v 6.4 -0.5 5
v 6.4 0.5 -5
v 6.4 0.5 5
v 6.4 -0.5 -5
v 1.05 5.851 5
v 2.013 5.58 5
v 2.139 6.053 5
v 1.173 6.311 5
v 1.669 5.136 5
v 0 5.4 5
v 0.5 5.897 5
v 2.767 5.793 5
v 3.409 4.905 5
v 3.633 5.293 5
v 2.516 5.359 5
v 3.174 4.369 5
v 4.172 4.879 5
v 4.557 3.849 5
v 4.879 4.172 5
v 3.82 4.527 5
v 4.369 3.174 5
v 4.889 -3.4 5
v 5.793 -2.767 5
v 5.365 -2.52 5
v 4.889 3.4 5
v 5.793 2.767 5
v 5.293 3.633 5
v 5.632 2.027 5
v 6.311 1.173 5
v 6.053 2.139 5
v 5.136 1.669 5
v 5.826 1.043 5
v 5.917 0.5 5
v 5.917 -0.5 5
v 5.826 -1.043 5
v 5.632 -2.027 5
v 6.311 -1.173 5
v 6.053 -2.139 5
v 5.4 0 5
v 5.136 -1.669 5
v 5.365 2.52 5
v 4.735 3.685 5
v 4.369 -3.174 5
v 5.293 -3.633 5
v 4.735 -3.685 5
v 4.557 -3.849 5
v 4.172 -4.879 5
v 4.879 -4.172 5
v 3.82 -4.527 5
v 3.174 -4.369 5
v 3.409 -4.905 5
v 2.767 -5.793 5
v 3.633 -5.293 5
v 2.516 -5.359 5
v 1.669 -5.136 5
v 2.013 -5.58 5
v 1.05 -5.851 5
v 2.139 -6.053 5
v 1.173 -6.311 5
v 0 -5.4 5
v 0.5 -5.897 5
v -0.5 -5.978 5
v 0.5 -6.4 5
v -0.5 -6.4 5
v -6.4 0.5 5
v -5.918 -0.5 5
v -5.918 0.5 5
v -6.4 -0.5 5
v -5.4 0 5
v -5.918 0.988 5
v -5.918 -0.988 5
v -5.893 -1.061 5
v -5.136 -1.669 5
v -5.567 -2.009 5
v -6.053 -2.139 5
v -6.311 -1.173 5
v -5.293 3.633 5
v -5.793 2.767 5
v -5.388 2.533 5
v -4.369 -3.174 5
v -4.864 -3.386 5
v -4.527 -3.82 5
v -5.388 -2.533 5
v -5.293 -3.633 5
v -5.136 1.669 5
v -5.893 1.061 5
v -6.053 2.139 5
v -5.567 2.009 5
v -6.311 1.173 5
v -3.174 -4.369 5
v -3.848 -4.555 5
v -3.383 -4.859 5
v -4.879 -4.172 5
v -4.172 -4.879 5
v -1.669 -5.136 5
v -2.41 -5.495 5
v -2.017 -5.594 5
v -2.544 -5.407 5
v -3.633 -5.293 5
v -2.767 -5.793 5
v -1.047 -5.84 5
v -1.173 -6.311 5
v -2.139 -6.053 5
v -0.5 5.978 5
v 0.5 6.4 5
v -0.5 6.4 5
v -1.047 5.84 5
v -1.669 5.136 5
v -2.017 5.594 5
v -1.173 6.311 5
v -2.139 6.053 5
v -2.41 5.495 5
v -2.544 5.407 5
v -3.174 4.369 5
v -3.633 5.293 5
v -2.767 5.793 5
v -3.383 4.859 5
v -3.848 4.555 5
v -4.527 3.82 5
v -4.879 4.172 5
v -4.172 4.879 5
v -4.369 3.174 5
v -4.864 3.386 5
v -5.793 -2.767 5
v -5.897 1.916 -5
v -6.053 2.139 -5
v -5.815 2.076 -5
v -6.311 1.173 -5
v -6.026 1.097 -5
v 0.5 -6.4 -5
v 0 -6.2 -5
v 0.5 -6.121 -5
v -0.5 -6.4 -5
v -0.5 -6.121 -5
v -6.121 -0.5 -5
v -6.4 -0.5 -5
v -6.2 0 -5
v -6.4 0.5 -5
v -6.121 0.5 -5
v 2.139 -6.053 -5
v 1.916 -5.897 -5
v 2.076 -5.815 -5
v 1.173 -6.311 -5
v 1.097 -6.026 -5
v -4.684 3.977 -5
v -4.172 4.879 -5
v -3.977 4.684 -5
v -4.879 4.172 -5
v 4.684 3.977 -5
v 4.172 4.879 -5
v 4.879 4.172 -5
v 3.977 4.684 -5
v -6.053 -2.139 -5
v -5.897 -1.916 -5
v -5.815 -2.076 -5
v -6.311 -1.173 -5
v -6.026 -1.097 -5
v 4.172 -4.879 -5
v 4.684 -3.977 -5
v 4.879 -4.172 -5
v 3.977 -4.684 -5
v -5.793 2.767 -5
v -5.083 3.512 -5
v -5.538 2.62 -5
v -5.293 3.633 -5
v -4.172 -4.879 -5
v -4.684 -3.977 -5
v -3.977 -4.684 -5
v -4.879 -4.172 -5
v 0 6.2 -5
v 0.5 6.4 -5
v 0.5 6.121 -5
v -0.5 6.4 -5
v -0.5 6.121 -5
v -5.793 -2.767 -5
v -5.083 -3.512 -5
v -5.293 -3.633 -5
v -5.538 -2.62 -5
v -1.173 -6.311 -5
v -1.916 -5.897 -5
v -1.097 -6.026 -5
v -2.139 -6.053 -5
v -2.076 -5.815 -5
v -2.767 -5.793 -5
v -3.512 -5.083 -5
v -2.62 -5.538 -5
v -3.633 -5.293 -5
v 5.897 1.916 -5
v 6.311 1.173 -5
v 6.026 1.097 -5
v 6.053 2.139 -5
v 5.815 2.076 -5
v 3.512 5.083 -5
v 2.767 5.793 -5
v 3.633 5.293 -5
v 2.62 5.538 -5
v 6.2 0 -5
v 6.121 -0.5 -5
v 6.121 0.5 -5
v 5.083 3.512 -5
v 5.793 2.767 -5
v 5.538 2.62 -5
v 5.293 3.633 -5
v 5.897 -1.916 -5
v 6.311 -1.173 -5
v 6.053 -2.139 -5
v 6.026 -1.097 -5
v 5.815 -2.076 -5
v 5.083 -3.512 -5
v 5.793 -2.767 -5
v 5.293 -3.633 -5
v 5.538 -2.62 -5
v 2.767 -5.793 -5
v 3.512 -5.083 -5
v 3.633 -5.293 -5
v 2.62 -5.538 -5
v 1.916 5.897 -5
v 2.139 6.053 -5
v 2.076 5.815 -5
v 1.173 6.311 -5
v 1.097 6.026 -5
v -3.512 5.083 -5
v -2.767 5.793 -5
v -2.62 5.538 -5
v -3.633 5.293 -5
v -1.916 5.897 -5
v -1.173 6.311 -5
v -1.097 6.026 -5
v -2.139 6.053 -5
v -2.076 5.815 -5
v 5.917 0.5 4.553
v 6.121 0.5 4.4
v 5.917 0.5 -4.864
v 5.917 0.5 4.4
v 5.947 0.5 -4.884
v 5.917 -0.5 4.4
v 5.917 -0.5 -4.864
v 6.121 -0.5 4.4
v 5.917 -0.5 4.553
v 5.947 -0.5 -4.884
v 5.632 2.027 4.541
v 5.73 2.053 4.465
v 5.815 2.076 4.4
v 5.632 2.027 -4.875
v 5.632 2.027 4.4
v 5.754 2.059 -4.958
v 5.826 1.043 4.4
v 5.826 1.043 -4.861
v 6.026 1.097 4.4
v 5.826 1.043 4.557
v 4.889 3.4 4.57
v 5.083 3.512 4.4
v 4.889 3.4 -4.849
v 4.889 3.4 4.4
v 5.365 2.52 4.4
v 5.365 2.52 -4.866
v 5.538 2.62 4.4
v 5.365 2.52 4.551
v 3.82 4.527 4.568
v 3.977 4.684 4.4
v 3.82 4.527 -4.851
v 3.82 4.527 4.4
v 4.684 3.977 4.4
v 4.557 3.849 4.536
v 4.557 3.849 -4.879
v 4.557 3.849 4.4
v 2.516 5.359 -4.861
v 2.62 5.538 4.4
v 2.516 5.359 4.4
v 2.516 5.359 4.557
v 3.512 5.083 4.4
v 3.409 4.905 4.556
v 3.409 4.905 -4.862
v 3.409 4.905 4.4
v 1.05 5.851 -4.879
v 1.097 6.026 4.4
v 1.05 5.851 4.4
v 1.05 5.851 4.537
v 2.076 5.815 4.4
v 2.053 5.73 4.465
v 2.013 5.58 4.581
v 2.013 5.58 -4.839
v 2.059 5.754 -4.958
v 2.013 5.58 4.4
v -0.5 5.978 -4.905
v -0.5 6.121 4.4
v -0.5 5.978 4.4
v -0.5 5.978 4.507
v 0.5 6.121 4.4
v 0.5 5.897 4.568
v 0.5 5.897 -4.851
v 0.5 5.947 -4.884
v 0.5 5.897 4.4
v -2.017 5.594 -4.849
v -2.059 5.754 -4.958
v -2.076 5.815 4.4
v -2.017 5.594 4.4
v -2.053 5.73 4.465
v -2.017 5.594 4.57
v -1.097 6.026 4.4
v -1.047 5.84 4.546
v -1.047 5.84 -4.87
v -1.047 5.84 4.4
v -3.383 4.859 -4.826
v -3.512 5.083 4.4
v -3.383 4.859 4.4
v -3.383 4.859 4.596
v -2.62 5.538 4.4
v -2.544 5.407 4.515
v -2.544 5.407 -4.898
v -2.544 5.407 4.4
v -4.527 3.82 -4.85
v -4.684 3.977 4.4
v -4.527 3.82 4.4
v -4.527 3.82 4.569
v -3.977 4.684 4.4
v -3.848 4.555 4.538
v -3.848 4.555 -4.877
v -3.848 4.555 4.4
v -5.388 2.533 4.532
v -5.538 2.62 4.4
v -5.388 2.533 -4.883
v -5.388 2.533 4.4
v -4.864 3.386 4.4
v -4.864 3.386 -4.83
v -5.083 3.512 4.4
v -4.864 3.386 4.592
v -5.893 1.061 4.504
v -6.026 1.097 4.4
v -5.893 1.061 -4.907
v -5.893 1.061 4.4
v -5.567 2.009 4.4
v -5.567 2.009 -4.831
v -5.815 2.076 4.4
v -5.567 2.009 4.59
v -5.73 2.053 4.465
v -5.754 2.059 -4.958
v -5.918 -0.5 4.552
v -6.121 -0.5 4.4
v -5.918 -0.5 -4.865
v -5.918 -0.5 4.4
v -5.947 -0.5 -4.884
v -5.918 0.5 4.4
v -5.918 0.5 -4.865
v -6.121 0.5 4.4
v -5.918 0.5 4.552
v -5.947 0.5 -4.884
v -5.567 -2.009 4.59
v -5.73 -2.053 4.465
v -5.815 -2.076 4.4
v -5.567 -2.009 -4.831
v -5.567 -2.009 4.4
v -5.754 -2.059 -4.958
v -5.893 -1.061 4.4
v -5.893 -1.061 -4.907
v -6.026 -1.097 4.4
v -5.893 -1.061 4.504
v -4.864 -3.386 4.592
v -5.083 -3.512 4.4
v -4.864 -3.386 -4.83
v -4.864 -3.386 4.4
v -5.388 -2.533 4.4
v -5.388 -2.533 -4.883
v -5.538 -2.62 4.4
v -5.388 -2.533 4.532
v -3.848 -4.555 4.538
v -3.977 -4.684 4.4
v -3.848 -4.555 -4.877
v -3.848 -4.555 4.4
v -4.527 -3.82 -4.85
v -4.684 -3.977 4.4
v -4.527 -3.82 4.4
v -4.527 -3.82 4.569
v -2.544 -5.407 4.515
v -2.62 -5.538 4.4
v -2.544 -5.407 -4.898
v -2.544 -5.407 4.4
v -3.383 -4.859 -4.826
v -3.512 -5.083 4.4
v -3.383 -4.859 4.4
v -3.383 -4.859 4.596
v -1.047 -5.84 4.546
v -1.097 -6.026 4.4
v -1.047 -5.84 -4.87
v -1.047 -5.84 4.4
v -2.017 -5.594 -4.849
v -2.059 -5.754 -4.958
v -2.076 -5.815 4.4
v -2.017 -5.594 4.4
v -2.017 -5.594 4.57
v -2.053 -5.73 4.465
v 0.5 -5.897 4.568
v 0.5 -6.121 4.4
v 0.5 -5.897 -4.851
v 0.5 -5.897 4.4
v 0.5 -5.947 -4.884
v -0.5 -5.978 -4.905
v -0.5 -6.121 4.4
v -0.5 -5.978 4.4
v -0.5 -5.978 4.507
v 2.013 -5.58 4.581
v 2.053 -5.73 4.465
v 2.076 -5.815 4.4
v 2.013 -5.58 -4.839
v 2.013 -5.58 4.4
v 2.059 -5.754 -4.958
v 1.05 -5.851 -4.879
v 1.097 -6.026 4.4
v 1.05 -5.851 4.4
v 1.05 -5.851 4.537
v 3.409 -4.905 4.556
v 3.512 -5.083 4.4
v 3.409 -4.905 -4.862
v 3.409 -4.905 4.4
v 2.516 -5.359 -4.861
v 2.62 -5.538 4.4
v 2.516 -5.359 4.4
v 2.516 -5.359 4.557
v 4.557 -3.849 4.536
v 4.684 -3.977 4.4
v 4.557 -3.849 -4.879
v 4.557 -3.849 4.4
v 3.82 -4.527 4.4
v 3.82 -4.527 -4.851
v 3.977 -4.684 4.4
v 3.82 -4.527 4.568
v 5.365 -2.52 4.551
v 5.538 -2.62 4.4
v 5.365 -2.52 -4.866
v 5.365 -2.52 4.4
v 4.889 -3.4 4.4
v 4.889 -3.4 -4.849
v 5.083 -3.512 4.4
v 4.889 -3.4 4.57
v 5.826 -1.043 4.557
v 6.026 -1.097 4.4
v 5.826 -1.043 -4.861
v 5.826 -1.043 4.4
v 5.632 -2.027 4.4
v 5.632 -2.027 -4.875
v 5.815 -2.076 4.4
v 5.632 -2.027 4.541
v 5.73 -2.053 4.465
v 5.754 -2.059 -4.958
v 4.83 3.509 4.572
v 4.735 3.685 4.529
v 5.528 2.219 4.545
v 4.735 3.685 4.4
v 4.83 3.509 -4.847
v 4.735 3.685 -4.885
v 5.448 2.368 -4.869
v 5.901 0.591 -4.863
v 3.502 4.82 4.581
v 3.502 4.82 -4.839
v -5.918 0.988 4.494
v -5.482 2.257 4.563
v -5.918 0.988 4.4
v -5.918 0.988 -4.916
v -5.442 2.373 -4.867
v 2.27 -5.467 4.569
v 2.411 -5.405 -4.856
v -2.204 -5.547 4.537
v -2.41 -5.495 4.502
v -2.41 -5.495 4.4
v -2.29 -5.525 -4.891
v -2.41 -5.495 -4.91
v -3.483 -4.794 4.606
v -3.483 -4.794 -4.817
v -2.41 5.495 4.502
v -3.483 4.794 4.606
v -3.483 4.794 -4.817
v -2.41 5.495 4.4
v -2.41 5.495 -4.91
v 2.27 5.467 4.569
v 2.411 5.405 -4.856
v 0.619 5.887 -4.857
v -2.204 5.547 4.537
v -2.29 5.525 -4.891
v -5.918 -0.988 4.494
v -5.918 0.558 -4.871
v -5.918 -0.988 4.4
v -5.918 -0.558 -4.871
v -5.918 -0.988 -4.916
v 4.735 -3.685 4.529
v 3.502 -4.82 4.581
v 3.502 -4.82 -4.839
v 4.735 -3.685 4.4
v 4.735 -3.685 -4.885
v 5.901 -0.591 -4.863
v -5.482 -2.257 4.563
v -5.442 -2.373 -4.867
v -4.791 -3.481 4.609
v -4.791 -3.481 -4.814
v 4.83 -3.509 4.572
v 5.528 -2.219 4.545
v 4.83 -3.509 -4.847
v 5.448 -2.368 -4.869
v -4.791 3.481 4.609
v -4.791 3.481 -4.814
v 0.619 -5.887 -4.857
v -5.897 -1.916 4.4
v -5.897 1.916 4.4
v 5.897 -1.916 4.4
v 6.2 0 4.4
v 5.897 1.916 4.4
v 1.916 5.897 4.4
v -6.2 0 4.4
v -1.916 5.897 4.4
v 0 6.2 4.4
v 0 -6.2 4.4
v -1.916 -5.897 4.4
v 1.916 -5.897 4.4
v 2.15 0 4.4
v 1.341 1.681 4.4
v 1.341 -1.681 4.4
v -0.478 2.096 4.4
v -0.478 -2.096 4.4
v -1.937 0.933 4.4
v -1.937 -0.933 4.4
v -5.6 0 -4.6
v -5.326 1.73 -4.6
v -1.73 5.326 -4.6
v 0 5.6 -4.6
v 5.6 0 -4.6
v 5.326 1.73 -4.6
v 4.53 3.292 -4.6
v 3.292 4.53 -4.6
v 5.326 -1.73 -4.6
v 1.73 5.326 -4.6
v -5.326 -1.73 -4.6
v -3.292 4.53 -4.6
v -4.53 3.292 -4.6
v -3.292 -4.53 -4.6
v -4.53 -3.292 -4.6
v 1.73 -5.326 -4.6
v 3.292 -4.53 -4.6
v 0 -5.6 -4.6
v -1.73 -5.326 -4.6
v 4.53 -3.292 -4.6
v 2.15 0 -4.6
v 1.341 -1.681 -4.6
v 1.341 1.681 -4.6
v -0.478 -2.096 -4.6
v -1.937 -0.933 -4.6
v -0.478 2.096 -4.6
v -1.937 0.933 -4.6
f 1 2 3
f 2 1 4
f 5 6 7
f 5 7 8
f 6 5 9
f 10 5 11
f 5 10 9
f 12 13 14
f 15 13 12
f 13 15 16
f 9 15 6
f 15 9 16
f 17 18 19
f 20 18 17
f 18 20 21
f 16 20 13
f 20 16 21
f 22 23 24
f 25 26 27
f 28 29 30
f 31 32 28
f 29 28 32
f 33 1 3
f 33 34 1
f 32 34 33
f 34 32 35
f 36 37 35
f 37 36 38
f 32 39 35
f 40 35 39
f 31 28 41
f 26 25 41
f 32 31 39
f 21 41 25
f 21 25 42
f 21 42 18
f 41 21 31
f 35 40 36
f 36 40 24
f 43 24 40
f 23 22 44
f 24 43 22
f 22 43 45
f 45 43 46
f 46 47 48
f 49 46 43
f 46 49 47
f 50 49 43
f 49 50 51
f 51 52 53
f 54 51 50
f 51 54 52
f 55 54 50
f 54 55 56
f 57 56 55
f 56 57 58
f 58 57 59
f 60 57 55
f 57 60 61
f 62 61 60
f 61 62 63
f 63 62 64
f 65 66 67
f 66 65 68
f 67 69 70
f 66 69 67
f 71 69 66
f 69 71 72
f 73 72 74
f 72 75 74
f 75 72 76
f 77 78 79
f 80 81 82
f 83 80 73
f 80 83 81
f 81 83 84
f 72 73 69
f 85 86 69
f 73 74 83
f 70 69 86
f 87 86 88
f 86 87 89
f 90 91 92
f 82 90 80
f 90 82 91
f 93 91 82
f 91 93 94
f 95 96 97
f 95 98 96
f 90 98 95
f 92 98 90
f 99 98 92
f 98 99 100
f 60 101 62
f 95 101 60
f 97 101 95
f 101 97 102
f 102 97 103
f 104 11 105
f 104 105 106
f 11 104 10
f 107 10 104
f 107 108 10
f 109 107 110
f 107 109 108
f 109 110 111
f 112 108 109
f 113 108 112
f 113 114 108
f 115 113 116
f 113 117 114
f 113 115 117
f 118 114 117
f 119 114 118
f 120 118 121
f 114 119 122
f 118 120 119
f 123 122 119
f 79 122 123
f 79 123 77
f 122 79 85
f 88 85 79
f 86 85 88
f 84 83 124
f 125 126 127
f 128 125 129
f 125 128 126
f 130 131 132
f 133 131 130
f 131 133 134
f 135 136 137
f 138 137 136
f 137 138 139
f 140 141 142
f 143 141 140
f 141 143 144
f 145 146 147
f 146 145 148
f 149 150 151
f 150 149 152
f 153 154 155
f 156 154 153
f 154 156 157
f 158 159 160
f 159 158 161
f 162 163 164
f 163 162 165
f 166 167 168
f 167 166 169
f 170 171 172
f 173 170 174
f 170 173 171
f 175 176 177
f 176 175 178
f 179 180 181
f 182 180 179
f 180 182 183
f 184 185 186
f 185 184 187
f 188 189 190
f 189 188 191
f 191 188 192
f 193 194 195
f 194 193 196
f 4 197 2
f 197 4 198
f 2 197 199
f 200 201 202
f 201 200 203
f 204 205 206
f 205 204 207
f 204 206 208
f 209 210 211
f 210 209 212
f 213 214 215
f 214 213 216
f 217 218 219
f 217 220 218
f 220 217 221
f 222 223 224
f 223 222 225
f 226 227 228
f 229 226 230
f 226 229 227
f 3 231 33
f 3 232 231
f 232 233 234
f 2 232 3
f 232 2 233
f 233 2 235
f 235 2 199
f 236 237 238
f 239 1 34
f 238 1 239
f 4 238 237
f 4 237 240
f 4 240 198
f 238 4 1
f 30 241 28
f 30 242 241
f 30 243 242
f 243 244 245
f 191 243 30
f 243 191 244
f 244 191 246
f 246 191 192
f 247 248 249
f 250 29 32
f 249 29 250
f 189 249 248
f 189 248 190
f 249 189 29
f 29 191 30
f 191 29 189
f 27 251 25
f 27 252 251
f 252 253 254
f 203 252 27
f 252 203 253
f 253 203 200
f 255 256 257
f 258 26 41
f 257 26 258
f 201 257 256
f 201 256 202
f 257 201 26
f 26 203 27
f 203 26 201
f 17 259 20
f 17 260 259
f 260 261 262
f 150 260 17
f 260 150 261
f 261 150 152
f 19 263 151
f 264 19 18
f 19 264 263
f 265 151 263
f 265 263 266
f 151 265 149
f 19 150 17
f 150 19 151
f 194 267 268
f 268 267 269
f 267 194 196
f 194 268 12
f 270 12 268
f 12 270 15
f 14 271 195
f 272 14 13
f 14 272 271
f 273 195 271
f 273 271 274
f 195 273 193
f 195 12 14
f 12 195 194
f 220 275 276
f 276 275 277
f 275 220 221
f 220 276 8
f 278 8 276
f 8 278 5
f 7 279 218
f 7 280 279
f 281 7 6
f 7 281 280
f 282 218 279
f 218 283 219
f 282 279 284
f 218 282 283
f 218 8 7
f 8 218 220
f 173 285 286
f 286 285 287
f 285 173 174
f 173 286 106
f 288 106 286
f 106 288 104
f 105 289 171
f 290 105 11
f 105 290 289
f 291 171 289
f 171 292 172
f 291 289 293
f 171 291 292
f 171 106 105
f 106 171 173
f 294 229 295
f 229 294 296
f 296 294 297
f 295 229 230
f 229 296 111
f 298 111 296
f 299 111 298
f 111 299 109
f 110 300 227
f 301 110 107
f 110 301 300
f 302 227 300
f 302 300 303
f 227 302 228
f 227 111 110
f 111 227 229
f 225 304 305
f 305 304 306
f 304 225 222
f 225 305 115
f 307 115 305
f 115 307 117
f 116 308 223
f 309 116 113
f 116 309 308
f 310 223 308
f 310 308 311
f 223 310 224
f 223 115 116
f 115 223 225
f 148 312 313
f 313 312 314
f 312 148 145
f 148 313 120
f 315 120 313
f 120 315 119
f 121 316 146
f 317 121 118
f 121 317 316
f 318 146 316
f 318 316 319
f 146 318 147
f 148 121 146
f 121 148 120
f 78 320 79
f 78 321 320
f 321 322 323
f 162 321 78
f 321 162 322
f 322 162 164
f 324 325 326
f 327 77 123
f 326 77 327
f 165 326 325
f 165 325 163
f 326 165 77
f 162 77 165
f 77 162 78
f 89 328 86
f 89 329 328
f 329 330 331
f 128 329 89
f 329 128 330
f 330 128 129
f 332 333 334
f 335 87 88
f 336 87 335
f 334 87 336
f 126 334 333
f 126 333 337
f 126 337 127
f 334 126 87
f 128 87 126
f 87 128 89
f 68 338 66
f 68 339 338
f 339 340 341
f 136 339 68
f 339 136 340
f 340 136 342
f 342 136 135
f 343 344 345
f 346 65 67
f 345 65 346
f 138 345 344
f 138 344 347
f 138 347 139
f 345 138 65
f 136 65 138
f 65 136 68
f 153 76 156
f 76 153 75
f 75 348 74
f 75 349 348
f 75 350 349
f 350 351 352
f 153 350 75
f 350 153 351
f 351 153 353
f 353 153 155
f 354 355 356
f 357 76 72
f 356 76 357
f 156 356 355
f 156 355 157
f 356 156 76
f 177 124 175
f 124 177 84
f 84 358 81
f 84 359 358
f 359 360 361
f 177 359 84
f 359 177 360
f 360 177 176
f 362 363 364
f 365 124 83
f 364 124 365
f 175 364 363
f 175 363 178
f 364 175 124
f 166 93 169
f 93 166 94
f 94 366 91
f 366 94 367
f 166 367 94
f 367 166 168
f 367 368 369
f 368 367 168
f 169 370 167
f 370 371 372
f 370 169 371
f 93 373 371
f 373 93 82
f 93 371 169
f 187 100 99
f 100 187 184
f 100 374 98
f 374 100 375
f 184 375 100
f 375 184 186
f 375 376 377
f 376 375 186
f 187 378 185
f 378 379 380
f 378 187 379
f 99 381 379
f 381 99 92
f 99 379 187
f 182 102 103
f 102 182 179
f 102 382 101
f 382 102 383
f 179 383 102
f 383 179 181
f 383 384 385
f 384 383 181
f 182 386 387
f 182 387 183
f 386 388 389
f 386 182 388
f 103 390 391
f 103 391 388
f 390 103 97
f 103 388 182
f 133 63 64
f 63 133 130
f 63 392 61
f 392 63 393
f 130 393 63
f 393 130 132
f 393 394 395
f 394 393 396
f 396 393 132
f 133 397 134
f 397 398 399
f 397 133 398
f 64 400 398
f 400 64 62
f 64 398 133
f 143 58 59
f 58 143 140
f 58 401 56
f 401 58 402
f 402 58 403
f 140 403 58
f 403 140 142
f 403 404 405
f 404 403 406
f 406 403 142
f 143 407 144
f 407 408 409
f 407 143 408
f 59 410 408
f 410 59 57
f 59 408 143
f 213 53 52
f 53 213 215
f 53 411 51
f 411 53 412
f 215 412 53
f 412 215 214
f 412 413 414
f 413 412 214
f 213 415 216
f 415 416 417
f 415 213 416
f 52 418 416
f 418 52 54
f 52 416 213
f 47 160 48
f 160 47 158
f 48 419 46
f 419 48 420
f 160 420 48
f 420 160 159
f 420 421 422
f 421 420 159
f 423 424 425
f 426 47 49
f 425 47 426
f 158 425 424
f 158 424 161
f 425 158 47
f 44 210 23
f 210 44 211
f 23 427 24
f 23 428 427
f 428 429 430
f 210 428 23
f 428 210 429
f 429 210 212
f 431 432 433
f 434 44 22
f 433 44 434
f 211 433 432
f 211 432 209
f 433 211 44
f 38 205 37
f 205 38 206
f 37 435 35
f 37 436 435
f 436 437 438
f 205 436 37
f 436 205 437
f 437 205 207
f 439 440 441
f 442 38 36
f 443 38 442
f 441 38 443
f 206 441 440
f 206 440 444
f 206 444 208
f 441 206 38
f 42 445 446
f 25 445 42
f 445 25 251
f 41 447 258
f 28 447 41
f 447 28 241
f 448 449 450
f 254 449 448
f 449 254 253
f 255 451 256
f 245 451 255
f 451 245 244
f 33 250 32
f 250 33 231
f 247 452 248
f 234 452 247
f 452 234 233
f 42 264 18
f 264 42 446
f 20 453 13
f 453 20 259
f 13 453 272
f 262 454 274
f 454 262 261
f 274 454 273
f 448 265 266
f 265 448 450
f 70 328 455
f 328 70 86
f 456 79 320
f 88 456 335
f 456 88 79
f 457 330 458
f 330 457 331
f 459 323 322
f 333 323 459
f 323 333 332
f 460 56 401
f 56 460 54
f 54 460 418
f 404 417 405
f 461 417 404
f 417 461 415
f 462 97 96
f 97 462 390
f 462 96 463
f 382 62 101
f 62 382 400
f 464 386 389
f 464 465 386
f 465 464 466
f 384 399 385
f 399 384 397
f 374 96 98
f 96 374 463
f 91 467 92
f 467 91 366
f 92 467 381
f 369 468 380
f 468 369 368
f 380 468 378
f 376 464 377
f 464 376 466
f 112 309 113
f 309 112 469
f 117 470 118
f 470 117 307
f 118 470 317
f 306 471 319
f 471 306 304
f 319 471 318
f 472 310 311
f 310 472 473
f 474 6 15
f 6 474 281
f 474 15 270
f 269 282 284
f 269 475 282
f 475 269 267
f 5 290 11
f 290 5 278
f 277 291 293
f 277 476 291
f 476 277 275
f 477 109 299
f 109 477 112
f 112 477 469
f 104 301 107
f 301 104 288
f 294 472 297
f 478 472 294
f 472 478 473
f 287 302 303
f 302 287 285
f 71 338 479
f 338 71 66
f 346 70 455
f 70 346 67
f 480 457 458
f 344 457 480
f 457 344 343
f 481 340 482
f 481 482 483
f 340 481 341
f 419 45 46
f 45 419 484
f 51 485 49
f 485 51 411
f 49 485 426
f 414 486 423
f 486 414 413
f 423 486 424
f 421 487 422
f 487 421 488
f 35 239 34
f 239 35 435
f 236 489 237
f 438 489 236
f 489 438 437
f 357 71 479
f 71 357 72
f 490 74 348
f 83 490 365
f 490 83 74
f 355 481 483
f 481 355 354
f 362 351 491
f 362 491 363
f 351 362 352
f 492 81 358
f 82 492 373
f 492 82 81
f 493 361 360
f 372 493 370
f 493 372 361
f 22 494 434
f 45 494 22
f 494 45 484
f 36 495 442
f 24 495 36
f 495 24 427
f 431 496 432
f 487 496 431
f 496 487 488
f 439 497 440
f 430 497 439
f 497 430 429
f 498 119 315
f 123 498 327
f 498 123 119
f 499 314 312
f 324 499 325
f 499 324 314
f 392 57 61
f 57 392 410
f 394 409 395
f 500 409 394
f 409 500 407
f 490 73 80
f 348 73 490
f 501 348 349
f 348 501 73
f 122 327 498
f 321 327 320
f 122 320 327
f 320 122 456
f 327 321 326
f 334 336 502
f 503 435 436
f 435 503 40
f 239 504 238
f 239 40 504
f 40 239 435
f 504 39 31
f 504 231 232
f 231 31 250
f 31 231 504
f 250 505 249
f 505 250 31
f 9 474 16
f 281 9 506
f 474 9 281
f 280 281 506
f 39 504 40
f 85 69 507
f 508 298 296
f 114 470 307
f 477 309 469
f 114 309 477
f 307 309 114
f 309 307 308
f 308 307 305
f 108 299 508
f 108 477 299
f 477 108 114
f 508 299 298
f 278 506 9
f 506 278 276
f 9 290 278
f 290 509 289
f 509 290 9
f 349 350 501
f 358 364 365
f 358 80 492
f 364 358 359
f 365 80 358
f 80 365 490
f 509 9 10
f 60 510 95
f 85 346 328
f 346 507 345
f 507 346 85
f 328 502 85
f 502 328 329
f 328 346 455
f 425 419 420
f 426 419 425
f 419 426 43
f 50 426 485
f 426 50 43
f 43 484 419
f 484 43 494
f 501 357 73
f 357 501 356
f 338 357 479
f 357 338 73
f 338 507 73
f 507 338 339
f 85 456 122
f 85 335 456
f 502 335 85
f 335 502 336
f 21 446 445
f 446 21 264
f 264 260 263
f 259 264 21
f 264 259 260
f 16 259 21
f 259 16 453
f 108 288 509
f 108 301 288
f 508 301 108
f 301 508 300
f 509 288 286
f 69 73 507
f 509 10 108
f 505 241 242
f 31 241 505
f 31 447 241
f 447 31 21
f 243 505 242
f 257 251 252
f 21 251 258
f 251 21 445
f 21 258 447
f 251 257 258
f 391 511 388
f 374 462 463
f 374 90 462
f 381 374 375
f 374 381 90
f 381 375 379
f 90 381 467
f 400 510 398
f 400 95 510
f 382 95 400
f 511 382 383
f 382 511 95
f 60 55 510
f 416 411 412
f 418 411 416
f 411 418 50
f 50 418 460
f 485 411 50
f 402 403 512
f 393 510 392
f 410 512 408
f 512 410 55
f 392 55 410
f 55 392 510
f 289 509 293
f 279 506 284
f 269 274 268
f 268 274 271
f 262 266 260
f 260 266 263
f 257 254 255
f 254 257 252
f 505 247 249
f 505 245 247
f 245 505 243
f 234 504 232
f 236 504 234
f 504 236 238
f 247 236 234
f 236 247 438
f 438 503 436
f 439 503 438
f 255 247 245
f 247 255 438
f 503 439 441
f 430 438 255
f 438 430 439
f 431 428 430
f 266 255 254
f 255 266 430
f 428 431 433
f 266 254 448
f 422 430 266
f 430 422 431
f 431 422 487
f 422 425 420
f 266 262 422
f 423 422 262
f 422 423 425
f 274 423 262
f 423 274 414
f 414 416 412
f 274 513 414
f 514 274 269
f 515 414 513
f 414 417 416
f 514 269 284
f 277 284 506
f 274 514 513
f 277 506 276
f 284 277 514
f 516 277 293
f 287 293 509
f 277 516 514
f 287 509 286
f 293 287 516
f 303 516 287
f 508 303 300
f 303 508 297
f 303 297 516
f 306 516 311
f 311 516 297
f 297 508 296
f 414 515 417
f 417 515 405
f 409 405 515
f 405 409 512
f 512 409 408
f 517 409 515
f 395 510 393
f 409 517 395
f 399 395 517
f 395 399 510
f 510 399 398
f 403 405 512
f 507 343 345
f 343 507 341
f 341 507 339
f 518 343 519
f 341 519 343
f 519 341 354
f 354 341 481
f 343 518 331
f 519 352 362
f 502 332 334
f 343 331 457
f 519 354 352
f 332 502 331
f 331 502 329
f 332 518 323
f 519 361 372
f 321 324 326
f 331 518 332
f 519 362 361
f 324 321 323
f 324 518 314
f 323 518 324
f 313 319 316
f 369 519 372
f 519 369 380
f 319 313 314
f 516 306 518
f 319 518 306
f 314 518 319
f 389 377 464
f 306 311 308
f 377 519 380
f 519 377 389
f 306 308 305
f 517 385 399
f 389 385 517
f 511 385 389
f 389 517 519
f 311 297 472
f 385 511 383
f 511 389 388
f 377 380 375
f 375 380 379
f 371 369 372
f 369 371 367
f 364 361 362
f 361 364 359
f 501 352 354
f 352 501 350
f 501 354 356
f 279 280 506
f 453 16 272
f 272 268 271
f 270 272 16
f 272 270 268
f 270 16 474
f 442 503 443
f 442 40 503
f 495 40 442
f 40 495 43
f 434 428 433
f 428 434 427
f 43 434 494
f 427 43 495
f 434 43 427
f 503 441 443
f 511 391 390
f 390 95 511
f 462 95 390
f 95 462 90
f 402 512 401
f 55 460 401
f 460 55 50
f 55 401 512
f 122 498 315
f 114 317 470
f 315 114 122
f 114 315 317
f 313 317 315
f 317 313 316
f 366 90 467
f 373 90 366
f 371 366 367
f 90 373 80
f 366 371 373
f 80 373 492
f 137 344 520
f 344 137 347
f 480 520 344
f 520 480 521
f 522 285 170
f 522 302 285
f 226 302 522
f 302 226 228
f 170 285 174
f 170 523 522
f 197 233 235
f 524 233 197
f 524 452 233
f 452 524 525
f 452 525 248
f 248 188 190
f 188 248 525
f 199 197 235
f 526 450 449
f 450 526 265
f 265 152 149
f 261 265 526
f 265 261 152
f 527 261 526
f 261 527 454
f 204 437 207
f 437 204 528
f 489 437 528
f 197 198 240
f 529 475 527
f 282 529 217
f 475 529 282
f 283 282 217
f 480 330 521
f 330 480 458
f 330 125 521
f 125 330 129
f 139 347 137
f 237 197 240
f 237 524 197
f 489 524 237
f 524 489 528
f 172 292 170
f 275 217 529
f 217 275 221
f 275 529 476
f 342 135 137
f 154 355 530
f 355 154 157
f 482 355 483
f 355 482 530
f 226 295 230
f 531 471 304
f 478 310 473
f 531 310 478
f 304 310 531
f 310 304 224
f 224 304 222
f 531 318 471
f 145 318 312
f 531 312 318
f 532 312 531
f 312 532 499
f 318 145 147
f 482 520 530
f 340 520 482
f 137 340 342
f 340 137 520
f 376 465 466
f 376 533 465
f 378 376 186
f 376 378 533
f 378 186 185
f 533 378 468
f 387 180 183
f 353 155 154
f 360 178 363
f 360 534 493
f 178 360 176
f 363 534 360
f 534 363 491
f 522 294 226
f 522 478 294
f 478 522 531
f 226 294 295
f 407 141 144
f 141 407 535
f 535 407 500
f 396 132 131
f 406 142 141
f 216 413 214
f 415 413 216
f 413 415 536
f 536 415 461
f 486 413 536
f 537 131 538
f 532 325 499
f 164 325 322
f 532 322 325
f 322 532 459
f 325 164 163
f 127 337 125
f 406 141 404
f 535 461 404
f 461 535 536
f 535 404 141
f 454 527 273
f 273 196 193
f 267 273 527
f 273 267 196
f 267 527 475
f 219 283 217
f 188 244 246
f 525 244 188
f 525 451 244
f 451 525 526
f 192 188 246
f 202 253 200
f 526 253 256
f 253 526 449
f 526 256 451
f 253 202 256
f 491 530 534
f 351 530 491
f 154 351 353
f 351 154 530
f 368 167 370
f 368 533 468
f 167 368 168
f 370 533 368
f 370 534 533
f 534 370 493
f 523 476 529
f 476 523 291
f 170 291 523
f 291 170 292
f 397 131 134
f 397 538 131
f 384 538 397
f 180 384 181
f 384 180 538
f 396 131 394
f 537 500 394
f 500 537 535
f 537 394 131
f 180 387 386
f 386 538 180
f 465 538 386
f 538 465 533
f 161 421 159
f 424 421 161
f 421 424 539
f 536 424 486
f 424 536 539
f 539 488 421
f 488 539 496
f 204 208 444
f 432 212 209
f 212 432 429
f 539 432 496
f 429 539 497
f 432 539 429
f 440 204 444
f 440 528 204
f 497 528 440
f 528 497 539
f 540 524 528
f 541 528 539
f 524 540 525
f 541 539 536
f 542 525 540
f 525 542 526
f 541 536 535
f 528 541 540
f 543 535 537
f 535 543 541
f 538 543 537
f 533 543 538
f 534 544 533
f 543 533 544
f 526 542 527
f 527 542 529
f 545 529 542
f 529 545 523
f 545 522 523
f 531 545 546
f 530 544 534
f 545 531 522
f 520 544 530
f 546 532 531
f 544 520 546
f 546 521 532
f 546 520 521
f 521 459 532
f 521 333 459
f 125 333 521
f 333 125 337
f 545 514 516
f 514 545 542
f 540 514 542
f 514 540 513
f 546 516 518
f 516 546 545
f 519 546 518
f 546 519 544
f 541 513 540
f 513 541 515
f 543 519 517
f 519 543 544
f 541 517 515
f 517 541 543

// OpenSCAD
// Parameters
outer_diameter_mm = 12.0; //[6.0:24.0:0.1]
length_mm = 10.0; //[5.0:20.0:0.1]
screw_diameter_mm = 5.0; //[2.5:10.0:0.1]
internal_thread_pitch_mm = 0.8; //[0.4:1.6:0.05]
internal_minor_diameter_mm = 4.2; //[2.1:8.4:0.05]
internal_major_diameter_mm = 5.0; //[2.5:10.0:0.05]
lead_in_chamfer_depth_mm = 0.6; //[0.3:1.2:0.05]
lead_in_chamfer_angle_deg = 45; //[15:75:1]
end_chamfer_depth_mm = 0.4; //[0.2:1.0:0.05]
end_chamfer_angle_deg = 30; //[15:75:1]
knurl_height_mm = 0.4; //[0.2:1.0:0.05]
knurl_count = 24; //[8:64:1]
knurl_rib_width_mm = 1.0; //[0.5:2.0:0.05]
knurl_overlap_mm = 0.8; //[0.5:2.0:0.05]
chamfer_clearance_mm = 0.2; //[0.1:0.6:0.05]
bore_clearance_mm = 0.1; //[0.0:0.3:0.05]

// Threaded Insert - complete geometry
module threaded_insert() {
  color([0.8, 0.6, 0.2]) { // Brass color
    difference() {
      union() {
        // Insert body
        cylinder(h=length_mm, r=outer_diameter_mm/2, center=true);
        
        // Knurl ribs
        for (i = [0:knurl_count-1]) {
          rotate([0, 0, i*360/knurl_count])
          translate([outer_diameter_mm/2 + (knurl_height_mm + knurl_overlap_mm)/2 - knurl_overlap_mm, 0, 0])
          cube([knurl_height_mm + knurl_overlap_mm, knurl_rib_width_mm, length_mm], center=true);
        }
      }
      
      // Lead-in chamfer
      translate([0, 0, length_mm/2 - lead_in_chamfer_depth_mm/2])
      cylinder(h=lead_in_chamfer_depth_mm, r1=(outer_diameter_mm/2) + chamfer_clearance_mm, r2=(outer_diameter_mm/2) - lead_in_chamfer_depth_mm, center=true);
      
      // Installation-end chamfer
      translate([0, 0, -length_mm/2 + end_chamfer_depth_mm/2])
      cylinder(h=end_chamfer_depth_mm, r1=(outer_diameter_mm/2) + chamfer_clearance_mm, r2=(outer_diameter_mm/2) - end_chamfer_depth_mm, center=true);
      
      // Internal thread or clearance bore
      cylinder(h=length_mm + 2, r=(internal_minor_diameter_mm + bore_clearance_mm)/2, center=true);
    }
  }
}

// Assembly
module assembly() {
  threaded_insert();
}

assembly();
